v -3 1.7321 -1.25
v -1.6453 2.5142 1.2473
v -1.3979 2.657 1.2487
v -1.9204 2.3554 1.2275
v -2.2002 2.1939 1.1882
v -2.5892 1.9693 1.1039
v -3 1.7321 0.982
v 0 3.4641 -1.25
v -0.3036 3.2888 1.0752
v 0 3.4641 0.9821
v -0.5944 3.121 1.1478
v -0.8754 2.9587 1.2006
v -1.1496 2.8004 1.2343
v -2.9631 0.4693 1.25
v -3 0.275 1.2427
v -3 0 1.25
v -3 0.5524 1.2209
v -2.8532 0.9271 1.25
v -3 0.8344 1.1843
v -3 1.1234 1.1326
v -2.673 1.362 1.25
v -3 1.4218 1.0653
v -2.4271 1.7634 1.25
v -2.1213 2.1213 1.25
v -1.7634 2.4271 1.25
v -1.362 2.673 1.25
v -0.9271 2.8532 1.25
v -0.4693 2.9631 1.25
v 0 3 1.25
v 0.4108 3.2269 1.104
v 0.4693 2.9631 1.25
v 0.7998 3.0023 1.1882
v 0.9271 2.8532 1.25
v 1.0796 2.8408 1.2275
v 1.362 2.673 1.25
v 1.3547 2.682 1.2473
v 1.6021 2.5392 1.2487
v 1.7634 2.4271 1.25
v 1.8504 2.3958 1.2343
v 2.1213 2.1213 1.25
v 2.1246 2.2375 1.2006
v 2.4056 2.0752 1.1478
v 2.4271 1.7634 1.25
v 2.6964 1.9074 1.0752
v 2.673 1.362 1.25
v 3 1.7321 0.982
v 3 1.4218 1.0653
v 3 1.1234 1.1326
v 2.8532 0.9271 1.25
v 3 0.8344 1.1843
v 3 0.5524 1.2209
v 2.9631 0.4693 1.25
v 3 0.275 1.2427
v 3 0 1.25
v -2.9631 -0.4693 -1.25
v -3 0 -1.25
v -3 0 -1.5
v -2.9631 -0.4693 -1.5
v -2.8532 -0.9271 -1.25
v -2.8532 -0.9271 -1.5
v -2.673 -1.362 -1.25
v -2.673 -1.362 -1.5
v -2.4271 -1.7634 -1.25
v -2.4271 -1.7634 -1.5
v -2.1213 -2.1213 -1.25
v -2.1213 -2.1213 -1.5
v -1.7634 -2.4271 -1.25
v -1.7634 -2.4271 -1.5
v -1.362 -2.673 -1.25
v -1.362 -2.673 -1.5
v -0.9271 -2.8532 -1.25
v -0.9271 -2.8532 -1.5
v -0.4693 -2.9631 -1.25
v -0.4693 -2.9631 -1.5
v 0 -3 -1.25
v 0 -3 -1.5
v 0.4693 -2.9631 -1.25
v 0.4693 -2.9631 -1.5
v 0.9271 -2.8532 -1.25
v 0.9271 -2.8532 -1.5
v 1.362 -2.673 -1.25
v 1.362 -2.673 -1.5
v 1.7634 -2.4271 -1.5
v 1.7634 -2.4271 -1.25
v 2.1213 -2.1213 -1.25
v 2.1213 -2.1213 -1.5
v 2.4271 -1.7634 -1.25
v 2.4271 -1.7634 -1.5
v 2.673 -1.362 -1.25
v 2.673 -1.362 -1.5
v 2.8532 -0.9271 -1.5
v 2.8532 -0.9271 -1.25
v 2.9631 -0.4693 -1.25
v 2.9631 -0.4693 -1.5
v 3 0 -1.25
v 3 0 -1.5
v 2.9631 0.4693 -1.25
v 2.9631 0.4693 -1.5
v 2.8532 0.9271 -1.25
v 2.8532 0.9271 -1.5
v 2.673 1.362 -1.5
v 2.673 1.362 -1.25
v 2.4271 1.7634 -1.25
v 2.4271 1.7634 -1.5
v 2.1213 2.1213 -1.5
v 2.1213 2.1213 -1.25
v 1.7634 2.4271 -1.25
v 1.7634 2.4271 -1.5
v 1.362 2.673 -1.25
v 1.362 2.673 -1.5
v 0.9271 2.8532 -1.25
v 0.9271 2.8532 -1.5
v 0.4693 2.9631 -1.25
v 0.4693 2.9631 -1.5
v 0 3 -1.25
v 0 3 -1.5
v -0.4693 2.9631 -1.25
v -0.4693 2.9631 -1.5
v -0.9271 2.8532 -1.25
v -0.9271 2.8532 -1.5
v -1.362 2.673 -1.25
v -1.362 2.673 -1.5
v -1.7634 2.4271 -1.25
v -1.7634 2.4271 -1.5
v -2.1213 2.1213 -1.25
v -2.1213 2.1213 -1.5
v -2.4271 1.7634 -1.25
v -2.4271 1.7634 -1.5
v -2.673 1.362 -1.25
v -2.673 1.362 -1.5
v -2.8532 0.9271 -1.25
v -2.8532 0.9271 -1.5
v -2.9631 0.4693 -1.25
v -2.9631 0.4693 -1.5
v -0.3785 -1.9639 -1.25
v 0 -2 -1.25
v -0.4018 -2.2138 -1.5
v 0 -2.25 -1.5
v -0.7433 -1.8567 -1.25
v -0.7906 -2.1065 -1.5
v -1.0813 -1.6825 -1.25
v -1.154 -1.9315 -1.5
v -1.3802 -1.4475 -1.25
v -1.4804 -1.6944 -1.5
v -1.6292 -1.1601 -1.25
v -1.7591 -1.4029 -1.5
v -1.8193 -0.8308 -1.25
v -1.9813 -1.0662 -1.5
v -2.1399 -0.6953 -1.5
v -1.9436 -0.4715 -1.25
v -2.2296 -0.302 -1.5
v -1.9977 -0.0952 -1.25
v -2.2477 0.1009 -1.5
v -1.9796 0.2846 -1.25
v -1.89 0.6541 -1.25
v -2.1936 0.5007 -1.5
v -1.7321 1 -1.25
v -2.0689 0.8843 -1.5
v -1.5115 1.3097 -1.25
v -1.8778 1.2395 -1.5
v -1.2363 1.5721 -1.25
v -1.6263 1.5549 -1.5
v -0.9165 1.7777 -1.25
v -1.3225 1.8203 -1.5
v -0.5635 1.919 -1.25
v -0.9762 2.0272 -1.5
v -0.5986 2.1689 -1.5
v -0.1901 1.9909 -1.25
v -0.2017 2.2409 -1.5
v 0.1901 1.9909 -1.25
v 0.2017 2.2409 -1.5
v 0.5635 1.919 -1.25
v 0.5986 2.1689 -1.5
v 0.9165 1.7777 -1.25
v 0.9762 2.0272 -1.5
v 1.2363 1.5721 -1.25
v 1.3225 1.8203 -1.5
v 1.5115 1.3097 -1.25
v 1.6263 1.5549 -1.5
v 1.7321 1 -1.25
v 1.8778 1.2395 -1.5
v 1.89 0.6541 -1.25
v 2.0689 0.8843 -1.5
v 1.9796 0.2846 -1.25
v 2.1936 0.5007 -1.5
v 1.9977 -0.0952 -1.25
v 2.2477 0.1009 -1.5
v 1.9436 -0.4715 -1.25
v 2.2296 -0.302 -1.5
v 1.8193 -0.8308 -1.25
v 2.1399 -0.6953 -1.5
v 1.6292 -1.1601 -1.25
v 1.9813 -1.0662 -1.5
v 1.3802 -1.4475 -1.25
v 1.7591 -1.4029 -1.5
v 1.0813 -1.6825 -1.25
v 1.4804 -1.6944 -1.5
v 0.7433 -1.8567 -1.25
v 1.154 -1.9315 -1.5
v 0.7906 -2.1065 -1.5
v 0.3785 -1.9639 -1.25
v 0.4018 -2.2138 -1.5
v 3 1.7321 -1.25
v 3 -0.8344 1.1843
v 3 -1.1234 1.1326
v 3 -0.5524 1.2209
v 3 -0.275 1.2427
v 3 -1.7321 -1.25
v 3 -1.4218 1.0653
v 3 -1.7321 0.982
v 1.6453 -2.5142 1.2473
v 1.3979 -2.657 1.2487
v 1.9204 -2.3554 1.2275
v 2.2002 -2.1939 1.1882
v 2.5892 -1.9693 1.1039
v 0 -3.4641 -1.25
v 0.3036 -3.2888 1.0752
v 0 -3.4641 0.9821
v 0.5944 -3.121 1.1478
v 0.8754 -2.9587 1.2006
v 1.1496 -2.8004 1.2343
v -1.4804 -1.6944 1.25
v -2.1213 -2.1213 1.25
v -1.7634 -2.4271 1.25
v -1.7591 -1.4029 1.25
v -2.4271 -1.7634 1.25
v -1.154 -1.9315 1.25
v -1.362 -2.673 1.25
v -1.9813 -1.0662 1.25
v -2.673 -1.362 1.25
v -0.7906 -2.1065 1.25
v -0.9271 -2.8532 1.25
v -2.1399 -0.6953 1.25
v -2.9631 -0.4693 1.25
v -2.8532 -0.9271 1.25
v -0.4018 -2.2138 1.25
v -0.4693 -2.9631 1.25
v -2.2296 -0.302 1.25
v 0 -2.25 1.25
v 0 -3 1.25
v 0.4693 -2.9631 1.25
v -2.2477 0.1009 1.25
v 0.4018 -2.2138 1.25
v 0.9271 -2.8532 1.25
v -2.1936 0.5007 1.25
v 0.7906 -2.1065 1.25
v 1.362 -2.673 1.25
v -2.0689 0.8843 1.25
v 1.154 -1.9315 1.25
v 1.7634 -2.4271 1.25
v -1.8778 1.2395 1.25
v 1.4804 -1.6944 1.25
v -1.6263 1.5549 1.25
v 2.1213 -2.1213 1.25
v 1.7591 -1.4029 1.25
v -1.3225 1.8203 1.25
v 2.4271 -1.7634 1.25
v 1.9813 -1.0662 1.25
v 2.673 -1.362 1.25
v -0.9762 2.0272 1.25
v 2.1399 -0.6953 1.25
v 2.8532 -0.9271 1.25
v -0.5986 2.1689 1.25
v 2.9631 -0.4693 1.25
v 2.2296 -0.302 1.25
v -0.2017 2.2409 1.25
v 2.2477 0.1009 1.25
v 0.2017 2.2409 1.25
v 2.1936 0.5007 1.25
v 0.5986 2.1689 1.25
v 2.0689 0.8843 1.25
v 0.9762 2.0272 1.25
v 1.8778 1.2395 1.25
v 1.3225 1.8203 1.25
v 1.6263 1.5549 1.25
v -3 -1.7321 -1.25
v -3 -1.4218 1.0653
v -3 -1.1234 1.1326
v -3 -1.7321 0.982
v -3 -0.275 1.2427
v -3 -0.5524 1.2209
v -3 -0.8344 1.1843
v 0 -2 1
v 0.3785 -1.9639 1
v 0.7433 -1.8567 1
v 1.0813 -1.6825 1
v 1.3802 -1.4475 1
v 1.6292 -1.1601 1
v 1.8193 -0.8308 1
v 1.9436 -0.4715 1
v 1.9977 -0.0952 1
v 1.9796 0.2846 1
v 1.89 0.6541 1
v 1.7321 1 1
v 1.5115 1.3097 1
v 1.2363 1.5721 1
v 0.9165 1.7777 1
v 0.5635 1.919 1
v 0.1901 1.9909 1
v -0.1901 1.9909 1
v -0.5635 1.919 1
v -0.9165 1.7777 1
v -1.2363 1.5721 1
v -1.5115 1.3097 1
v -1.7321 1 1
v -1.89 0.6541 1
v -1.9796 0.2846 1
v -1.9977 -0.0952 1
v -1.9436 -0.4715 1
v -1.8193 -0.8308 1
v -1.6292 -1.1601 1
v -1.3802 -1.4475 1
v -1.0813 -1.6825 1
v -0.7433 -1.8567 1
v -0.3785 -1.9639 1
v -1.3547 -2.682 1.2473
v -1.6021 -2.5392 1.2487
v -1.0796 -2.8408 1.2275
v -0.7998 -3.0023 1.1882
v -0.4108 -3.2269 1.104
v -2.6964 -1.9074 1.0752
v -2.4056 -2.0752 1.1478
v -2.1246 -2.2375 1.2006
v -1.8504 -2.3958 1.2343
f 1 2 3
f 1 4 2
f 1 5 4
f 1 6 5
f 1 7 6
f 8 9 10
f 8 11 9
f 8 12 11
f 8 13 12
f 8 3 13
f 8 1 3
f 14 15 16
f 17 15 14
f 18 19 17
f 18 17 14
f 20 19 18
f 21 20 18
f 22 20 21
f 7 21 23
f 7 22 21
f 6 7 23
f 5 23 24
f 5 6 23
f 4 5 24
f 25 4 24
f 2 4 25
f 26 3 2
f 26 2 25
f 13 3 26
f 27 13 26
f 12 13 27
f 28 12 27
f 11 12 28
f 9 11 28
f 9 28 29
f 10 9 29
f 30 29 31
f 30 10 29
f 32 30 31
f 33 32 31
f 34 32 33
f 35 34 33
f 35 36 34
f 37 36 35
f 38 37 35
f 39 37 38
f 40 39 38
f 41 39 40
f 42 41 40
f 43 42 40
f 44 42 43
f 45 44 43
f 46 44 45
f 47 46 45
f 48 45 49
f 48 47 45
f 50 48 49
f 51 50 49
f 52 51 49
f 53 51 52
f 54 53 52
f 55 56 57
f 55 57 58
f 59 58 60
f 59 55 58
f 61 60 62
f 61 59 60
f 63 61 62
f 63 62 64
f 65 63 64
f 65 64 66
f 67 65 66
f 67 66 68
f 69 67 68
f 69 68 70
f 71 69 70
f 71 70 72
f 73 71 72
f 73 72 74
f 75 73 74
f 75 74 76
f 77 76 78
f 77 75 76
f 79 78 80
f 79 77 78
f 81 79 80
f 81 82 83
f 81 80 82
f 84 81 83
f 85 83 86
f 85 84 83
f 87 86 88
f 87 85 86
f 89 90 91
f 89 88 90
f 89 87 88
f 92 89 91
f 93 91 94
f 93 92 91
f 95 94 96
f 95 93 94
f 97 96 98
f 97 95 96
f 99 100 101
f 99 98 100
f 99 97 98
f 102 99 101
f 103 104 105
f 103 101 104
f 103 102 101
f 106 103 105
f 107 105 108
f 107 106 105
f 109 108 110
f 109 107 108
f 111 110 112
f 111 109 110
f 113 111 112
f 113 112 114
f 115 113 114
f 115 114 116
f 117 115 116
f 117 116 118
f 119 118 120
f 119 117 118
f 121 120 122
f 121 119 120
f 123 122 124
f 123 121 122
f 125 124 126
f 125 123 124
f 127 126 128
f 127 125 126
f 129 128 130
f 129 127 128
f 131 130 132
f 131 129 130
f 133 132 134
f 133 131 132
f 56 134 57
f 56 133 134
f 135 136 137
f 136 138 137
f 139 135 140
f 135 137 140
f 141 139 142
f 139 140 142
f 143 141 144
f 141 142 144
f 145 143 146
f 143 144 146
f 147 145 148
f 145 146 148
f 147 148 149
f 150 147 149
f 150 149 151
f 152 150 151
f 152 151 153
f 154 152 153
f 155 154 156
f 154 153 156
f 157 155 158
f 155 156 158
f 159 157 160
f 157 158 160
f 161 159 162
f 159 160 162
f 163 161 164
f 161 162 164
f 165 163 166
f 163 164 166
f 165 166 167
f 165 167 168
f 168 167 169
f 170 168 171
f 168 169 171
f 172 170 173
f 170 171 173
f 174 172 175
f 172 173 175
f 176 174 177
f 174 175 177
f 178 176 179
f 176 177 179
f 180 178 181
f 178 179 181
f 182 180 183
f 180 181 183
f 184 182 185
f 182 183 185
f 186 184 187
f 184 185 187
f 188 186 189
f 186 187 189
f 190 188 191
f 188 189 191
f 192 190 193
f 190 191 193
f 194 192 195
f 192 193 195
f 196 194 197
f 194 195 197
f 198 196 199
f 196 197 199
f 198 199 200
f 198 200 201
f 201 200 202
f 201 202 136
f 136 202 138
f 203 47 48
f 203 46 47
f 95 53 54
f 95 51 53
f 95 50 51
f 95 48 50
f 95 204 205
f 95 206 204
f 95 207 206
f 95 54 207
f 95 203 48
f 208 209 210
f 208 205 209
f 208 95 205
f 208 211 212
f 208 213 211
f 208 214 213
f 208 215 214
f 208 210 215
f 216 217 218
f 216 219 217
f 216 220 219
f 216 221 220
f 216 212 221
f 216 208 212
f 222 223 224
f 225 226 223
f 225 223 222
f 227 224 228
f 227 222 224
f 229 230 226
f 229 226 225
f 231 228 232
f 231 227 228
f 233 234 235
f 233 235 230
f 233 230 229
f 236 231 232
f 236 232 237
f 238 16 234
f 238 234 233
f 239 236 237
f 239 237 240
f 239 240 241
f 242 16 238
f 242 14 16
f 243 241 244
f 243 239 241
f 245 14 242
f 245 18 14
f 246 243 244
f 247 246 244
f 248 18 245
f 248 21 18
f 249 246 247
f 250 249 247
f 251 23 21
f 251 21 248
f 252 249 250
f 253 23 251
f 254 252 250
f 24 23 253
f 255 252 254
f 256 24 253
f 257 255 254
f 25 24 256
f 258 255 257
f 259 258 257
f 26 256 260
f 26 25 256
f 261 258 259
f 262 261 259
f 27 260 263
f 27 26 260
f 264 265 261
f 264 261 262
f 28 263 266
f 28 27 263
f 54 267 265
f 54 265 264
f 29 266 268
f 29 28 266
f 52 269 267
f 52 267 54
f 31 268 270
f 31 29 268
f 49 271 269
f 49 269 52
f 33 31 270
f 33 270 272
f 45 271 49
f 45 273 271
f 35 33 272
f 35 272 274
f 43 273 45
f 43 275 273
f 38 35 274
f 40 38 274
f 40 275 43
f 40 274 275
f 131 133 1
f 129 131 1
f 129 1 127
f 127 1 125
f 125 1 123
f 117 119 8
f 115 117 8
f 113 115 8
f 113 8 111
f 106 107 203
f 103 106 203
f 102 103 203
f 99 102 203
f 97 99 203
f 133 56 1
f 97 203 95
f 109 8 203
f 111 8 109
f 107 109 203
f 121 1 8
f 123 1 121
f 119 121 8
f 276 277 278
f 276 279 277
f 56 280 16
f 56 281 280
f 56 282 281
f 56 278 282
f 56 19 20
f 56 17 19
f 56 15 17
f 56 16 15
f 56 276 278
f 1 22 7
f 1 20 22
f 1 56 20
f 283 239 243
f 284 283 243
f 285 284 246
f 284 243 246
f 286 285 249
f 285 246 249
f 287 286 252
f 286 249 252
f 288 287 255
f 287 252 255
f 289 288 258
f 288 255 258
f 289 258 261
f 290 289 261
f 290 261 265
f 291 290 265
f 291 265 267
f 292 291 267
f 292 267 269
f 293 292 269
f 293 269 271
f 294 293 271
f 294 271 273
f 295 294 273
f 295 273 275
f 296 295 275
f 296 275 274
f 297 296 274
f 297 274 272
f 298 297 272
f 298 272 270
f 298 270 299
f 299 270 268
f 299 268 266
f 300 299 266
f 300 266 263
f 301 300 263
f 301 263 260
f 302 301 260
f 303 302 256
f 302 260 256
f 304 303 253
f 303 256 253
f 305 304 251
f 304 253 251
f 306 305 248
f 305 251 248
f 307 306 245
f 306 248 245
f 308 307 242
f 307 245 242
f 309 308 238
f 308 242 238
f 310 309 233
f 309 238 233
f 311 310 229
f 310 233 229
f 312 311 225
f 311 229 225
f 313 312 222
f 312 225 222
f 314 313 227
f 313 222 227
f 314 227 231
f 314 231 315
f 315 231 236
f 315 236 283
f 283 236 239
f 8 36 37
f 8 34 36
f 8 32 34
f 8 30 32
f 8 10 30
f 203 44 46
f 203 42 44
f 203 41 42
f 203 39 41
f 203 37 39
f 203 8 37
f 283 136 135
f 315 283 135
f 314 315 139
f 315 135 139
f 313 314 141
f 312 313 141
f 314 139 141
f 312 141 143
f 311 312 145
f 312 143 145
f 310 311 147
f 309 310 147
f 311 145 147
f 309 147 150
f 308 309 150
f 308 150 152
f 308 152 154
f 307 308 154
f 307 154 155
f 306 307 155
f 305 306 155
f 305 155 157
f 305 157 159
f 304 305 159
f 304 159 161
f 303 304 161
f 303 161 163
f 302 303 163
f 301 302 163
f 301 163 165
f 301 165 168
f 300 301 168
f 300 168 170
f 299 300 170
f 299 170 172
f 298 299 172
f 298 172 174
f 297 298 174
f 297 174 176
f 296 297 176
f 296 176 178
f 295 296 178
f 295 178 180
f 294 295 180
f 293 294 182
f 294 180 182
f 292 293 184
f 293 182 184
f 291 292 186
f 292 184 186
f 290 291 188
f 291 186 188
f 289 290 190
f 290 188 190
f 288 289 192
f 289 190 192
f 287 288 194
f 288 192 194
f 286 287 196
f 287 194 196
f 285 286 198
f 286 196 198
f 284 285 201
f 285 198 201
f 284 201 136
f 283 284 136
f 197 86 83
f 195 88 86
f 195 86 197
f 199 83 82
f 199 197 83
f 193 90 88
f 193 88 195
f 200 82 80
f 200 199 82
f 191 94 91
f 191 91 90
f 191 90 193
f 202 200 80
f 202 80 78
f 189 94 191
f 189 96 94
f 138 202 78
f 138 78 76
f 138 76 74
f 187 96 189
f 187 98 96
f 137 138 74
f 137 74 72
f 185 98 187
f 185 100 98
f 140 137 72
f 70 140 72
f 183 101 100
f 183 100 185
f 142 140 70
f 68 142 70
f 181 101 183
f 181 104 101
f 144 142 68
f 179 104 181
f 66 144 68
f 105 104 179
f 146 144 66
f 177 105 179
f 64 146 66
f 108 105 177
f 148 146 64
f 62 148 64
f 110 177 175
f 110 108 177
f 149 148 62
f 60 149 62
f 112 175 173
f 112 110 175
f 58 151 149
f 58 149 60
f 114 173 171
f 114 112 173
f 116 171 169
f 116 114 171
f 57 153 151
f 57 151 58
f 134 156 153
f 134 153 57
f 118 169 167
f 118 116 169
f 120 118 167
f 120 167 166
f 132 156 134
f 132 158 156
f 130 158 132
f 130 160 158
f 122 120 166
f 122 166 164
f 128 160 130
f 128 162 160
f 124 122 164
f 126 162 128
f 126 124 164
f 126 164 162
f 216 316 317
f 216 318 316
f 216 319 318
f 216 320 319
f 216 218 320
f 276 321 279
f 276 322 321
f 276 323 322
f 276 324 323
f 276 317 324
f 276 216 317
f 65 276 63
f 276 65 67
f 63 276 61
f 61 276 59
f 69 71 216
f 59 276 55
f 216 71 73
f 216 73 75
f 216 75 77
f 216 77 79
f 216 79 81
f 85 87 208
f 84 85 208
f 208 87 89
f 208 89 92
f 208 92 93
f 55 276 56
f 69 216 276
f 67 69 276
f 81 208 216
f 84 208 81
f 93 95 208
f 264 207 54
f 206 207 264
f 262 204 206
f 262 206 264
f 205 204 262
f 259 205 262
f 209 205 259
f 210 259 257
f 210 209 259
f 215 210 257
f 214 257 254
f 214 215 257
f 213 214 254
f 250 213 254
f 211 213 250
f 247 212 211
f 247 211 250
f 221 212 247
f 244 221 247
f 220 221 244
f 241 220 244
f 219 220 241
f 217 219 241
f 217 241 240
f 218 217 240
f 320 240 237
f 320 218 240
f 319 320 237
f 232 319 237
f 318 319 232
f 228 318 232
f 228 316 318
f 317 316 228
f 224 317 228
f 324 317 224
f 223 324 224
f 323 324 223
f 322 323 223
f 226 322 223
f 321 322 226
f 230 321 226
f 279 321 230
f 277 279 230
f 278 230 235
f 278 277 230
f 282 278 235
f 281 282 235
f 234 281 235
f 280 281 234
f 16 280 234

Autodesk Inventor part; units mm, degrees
ref_plane "YZ Plane" through (0, 0, 0) normal (1, 0, 0) x (0, 1, 0)
ref_plane "XZ Plane" through (0, 0, 0) normal (0, 1, 0) x (-1, 0, 0)
ref_plane "XY Plane" through (0, 0, 0) normal (0, 0, 1) x (1, 0, 0)
sketch "Sketch1" plane through (0, 0, 0) normal (0, 0, 1) x (1, 0, 0)
  line L0 (0, 3.4641) -> (3, 1.7321)
  line L1 (3, 1.7321) -> (3, -1.7321)
  line L2 (3, -1.7321) -> (0, -3.4641)
  line L3 (0, -3.4641) -> (-3, -1.7321)
  line L4 (-3, -1.7321) -> (-3, 1.7321)
  line L5 (-3, 1.7321) -> (0, 3.4641)
  circle A0 centre (0, 0) radius 2 construction
  dimension "Diameter" = 4
  dimension "Width_Across_Flats" = 6
extrude "Extrusion1" add sketch "Sketch1" along normal mid plane 2.5
sketch "Sketch2" plane through (0, 0, 0) normal (0, 1, 0) x (-1, 0, 0)
  line L0 (-3, 1.25) -> (-3, -1.25) construction
  line L1 (0, 0) -> (0, 4.375)
  line L2 (-3, 1.25) -> (-5, 1.25)
  line L3 (-5, 1.25) -> (-5, 0.0953)
  line L4 (-5, 0.0953) -> (-3, 1.25)
  dimension "Chamfer_Angle" = 30
  dimension "Chamfer_Size" = 2
revolve "Revolution1" cut sketch "Sketch2" angle 360 about axis through (0, 0, 0) along (0, 0, 1)
sketch "Sketch3" plane through (0, 0, -1.25) normal (0, 0, -1) x (-1, 0, 0)
  line L0 (3, -1.7321) -> (0, -3.4641) construction
  circle A0 centre (0, 0) radius 3
extrude "Extrusion2" add sketch "Sketch3" along normal blind 0.25
hole "Hole1" at (0, 0, 1.25) direction (0, 0, -1) diameter 4 end through all
thread "Thread1" size "M4x0.7" class "6H" standard "ANSI Metric M Profile" full length
chamfer "Chamfer1" distance 0.25 angle 45 2 edges at (0, 2, 1.25) (0, 2, -1.5)
equation "\"Width_Across_Flats\" = 1.5 * Diameter"
equation "\"Thickness\" = 0.625 * Diameter"
equation "\"Chamfer_Size\" = 0.5 * Diameter"
equation "\"Hole_Diameter\" = Diameter"
properties part number "Hex Jam Nut with Washer Face"
